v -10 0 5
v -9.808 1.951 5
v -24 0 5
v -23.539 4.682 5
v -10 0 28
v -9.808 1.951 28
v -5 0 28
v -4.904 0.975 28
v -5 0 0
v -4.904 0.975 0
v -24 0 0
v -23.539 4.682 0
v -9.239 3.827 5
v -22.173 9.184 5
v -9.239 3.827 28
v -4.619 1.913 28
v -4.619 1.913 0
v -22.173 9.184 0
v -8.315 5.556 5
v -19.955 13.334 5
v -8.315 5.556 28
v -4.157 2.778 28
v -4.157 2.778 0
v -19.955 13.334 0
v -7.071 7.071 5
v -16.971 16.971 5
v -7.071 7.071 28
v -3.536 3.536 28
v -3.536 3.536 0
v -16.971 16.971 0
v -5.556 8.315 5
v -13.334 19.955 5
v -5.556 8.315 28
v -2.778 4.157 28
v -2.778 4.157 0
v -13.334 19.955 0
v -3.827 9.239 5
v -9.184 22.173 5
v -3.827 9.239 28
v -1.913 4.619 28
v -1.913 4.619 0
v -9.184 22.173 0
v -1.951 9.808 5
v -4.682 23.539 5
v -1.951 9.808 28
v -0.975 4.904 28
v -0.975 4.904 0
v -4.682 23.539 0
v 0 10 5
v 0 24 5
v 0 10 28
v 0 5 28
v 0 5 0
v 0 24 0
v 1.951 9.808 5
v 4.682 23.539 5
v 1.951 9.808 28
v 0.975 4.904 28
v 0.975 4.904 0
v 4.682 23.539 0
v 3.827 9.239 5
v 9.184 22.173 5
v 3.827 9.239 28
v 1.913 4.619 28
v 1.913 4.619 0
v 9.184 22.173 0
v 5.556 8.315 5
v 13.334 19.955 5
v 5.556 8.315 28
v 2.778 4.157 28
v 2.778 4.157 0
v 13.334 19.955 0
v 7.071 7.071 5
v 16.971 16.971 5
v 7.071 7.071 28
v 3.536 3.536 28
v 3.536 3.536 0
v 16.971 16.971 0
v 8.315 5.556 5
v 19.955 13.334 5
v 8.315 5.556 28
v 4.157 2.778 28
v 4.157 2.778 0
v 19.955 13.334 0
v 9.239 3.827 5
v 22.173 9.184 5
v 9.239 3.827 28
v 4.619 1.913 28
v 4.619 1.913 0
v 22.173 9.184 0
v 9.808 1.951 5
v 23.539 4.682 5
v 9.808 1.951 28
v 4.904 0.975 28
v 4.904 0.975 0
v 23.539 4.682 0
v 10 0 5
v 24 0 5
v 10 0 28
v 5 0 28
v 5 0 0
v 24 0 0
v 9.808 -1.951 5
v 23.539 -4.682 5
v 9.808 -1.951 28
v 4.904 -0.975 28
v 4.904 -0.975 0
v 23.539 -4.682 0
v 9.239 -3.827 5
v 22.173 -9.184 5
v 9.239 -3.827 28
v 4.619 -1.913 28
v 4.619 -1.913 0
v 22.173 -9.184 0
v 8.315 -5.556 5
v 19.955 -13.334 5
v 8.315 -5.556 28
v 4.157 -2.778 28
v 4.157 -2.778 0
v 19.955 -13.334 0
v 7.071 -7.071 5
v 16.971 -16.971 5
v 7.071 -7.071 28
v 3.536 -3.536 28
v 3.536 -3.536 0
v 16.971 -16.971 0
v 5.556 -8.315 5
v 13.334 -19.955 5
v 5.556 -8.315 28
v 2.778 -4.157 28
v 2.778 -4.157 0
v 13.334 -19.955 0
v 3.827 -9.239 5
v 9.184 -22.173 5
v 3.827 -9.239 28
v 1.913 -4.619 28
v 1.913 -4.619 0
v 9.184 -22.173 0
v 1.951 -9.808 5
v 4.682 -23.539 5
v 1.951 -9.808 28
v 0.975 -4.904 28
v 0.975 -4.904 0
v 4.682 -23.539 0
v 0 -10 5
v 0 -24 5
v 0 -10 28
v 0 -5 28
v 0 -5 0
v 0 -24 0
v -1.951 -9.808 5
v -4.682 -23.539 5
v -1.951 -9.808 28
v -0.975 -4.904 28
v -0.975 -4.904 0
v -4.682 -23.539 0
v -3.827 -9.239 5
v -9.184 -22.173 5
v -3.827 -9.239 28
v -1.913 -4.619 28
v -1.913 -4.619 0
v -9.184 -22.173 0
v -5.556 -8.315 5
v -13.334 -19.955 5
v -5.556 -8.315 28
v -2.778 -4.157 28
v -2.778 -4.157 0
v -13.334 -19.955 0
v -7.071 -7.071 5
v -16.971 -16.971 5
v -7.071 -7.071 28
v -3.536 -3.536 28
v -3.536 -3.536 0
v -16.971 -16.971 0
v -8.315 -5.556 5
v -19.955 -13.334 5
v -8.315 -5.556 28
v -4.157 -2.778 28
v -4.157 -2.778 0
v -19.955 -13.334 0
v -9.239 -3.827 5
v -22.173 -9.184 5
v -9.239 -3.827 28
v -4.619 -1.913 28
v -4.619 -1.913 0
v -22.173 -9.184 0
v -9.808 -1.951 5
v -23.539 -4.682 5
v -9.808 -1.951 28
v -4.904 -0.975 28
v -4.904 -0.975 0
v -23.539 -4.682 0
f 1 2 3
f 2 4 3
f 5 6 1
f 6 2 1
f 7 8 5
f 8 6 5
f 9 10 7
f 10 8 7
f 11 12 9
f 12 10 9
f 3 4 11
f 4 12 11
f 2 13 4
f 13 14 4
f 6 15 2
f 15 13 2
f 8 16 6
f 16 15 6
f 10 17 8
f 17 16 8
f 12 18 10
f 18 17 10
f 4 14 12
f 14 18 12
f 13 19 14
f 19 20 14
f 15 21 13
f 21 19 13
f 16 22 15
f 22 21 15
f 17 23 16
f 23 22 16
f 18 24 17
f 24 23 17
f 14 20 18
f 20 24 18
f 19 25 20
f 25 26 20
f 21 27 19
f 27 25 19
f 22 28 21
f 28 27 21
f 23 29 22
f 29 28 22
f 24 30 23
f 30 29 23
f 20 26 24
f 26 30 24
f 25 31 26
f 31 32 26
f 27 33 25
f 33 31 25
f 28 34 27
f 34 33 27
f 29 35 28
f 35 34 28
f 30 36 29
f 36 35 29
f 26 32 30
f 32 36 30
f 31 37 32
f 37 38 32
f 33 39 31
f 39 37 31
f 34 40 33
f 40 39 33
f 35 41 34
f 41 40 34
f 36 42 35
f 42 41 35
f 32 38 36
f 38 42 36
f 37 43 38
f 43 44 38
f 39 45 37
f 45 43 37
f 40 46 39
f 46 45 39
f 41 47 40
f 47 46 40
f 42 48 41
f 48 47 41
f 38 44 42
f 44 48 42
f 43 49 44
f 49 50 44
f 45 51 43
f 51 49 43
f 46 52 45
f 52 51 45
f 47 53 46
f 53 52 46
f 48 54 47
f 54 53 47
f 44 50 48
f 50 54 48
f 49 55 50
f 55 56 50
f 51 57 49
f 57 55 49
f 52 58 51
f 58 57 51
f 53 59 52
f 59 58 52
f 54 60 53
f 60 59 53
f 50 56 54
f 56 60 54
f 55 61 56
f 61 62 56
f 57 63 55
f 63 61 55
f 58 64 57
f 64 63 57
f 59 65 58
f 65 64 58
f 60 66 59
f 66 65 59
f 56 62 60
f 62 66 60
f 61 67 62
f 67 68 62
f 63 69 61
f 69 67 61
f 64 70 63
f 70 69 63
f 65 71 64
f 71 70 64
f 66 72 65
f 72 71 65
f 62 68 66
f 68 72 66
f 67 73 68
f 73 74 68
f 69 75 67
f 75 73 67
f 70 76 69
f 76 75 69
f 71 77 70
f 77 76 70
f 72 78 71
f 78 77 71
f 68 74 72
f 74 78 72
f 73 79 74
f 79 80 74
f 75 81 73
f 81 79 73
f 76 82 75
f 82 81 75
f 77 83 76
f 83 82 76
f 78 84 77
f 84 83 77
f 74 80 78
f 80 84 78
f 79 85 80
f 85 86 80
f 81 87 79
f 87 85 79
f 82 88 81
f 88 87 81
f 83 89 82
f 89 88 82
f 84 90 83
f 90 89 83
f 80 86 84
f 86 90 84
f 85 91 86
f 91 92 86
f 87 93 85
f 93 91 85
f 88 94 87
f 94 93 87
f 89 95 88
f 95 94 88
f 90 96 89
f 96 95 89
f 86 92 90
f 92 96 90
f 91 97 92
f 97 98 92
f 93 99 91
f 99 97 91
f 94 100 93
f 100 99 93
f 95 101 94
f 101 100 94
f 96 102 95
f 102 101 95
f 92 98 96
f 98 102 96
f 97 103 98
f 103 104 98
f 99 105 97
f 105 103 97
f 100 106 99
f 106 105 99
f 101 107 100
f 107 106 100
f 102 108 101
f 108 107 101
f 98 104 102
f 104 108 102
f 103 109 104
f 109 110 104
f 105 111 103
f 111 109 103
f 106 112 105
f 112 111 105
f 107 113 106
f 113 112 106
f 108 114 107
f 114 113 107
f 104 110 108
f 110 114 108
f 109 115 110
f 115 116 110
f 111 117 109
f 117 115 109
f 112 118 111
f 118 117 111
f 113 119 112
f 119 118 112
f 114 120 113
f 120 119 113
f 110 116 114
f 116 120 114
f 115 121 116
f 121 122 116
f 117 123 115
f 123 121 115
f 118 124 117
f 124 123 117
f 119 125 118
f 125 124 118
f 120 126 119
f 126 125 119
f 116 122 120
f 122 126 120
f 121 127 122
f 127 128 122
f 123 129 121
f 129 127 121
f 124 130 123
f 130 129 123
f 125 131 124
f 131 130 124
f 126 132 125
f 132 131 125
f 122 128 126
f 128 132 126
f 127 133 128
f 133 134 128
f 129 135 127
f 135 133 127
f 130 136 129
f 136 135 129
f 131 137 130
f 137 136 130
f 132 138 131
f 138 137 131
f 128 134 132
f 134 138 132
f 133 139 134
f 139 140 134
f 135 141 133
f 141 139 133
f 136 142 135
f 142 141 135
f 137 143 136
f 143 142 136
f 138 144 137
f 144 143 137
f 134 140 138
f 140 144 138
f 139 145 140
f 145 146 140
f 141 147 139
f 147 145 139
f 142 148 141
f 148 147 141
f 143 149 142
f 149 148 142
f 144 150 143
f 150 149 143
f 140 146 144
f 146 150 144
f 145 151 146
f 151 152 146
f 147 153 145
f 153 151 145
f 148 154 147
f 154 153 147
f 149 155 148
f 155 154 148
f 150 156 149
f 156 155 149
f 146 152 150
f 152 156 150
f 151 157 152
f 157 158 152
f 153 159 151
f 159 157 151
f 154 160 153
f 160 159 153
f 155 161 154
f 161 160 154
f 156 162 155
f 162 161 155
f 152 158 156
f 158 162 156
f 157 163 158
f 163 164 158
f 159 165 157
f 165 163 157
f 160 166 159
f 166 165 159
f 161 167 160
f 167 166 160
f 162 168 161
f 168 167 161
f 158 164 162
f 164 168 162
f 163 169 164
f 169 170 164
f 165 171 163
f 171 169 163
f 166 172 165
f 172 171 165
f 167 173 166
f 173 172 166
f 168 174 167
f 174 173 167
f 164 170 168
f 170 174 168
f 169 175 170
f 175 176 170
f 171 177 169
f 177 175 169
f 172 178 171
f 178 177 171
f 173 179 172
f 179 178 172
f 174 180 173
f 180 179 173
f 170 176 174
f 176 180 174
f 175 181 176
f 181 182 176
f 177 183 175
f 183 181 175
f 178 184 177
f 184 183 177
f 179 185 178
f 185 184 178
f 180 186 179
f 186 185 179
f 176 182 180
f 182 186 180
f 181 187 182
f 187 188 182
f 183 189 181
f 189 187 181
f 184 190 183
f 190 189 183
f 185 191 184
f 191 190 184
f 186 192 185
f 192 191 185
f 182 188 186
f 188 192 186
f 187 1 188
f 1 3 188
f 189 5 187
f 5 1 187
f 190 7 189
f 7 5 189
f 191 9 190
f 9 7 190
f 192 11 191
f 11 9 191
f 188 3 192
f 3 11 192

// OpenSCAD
$fn = 32;

// ----------------------------------------------------------------------
// Revolved part: flanged bushing R24
// ----------------------------------------------------------------------

// --- parameters (mm) ---
bore_r = 5;               // bore radius
flange_r = 24;            // flange radius
flange_h = 5;             // flange thickness
sleeve_r = 10;            // sleeve radius
total_h = 28;             // overall height
revolve_angle = 360;      // revolve sweep, degrees

bore_d = 2 * bore_r;
flange_d = 2 * flange_r;
sleeve_d = 2 * sleeve_r;

profile = [[5, 0], [24, 0], [24, 5], [10, 5], [10, 28], [5, 28]];  // primary outline, 6 points, counter clockwise

// --- the one profile operation ---
rotate_extrude(angle = revolve_angle) polygon(points = profile);
